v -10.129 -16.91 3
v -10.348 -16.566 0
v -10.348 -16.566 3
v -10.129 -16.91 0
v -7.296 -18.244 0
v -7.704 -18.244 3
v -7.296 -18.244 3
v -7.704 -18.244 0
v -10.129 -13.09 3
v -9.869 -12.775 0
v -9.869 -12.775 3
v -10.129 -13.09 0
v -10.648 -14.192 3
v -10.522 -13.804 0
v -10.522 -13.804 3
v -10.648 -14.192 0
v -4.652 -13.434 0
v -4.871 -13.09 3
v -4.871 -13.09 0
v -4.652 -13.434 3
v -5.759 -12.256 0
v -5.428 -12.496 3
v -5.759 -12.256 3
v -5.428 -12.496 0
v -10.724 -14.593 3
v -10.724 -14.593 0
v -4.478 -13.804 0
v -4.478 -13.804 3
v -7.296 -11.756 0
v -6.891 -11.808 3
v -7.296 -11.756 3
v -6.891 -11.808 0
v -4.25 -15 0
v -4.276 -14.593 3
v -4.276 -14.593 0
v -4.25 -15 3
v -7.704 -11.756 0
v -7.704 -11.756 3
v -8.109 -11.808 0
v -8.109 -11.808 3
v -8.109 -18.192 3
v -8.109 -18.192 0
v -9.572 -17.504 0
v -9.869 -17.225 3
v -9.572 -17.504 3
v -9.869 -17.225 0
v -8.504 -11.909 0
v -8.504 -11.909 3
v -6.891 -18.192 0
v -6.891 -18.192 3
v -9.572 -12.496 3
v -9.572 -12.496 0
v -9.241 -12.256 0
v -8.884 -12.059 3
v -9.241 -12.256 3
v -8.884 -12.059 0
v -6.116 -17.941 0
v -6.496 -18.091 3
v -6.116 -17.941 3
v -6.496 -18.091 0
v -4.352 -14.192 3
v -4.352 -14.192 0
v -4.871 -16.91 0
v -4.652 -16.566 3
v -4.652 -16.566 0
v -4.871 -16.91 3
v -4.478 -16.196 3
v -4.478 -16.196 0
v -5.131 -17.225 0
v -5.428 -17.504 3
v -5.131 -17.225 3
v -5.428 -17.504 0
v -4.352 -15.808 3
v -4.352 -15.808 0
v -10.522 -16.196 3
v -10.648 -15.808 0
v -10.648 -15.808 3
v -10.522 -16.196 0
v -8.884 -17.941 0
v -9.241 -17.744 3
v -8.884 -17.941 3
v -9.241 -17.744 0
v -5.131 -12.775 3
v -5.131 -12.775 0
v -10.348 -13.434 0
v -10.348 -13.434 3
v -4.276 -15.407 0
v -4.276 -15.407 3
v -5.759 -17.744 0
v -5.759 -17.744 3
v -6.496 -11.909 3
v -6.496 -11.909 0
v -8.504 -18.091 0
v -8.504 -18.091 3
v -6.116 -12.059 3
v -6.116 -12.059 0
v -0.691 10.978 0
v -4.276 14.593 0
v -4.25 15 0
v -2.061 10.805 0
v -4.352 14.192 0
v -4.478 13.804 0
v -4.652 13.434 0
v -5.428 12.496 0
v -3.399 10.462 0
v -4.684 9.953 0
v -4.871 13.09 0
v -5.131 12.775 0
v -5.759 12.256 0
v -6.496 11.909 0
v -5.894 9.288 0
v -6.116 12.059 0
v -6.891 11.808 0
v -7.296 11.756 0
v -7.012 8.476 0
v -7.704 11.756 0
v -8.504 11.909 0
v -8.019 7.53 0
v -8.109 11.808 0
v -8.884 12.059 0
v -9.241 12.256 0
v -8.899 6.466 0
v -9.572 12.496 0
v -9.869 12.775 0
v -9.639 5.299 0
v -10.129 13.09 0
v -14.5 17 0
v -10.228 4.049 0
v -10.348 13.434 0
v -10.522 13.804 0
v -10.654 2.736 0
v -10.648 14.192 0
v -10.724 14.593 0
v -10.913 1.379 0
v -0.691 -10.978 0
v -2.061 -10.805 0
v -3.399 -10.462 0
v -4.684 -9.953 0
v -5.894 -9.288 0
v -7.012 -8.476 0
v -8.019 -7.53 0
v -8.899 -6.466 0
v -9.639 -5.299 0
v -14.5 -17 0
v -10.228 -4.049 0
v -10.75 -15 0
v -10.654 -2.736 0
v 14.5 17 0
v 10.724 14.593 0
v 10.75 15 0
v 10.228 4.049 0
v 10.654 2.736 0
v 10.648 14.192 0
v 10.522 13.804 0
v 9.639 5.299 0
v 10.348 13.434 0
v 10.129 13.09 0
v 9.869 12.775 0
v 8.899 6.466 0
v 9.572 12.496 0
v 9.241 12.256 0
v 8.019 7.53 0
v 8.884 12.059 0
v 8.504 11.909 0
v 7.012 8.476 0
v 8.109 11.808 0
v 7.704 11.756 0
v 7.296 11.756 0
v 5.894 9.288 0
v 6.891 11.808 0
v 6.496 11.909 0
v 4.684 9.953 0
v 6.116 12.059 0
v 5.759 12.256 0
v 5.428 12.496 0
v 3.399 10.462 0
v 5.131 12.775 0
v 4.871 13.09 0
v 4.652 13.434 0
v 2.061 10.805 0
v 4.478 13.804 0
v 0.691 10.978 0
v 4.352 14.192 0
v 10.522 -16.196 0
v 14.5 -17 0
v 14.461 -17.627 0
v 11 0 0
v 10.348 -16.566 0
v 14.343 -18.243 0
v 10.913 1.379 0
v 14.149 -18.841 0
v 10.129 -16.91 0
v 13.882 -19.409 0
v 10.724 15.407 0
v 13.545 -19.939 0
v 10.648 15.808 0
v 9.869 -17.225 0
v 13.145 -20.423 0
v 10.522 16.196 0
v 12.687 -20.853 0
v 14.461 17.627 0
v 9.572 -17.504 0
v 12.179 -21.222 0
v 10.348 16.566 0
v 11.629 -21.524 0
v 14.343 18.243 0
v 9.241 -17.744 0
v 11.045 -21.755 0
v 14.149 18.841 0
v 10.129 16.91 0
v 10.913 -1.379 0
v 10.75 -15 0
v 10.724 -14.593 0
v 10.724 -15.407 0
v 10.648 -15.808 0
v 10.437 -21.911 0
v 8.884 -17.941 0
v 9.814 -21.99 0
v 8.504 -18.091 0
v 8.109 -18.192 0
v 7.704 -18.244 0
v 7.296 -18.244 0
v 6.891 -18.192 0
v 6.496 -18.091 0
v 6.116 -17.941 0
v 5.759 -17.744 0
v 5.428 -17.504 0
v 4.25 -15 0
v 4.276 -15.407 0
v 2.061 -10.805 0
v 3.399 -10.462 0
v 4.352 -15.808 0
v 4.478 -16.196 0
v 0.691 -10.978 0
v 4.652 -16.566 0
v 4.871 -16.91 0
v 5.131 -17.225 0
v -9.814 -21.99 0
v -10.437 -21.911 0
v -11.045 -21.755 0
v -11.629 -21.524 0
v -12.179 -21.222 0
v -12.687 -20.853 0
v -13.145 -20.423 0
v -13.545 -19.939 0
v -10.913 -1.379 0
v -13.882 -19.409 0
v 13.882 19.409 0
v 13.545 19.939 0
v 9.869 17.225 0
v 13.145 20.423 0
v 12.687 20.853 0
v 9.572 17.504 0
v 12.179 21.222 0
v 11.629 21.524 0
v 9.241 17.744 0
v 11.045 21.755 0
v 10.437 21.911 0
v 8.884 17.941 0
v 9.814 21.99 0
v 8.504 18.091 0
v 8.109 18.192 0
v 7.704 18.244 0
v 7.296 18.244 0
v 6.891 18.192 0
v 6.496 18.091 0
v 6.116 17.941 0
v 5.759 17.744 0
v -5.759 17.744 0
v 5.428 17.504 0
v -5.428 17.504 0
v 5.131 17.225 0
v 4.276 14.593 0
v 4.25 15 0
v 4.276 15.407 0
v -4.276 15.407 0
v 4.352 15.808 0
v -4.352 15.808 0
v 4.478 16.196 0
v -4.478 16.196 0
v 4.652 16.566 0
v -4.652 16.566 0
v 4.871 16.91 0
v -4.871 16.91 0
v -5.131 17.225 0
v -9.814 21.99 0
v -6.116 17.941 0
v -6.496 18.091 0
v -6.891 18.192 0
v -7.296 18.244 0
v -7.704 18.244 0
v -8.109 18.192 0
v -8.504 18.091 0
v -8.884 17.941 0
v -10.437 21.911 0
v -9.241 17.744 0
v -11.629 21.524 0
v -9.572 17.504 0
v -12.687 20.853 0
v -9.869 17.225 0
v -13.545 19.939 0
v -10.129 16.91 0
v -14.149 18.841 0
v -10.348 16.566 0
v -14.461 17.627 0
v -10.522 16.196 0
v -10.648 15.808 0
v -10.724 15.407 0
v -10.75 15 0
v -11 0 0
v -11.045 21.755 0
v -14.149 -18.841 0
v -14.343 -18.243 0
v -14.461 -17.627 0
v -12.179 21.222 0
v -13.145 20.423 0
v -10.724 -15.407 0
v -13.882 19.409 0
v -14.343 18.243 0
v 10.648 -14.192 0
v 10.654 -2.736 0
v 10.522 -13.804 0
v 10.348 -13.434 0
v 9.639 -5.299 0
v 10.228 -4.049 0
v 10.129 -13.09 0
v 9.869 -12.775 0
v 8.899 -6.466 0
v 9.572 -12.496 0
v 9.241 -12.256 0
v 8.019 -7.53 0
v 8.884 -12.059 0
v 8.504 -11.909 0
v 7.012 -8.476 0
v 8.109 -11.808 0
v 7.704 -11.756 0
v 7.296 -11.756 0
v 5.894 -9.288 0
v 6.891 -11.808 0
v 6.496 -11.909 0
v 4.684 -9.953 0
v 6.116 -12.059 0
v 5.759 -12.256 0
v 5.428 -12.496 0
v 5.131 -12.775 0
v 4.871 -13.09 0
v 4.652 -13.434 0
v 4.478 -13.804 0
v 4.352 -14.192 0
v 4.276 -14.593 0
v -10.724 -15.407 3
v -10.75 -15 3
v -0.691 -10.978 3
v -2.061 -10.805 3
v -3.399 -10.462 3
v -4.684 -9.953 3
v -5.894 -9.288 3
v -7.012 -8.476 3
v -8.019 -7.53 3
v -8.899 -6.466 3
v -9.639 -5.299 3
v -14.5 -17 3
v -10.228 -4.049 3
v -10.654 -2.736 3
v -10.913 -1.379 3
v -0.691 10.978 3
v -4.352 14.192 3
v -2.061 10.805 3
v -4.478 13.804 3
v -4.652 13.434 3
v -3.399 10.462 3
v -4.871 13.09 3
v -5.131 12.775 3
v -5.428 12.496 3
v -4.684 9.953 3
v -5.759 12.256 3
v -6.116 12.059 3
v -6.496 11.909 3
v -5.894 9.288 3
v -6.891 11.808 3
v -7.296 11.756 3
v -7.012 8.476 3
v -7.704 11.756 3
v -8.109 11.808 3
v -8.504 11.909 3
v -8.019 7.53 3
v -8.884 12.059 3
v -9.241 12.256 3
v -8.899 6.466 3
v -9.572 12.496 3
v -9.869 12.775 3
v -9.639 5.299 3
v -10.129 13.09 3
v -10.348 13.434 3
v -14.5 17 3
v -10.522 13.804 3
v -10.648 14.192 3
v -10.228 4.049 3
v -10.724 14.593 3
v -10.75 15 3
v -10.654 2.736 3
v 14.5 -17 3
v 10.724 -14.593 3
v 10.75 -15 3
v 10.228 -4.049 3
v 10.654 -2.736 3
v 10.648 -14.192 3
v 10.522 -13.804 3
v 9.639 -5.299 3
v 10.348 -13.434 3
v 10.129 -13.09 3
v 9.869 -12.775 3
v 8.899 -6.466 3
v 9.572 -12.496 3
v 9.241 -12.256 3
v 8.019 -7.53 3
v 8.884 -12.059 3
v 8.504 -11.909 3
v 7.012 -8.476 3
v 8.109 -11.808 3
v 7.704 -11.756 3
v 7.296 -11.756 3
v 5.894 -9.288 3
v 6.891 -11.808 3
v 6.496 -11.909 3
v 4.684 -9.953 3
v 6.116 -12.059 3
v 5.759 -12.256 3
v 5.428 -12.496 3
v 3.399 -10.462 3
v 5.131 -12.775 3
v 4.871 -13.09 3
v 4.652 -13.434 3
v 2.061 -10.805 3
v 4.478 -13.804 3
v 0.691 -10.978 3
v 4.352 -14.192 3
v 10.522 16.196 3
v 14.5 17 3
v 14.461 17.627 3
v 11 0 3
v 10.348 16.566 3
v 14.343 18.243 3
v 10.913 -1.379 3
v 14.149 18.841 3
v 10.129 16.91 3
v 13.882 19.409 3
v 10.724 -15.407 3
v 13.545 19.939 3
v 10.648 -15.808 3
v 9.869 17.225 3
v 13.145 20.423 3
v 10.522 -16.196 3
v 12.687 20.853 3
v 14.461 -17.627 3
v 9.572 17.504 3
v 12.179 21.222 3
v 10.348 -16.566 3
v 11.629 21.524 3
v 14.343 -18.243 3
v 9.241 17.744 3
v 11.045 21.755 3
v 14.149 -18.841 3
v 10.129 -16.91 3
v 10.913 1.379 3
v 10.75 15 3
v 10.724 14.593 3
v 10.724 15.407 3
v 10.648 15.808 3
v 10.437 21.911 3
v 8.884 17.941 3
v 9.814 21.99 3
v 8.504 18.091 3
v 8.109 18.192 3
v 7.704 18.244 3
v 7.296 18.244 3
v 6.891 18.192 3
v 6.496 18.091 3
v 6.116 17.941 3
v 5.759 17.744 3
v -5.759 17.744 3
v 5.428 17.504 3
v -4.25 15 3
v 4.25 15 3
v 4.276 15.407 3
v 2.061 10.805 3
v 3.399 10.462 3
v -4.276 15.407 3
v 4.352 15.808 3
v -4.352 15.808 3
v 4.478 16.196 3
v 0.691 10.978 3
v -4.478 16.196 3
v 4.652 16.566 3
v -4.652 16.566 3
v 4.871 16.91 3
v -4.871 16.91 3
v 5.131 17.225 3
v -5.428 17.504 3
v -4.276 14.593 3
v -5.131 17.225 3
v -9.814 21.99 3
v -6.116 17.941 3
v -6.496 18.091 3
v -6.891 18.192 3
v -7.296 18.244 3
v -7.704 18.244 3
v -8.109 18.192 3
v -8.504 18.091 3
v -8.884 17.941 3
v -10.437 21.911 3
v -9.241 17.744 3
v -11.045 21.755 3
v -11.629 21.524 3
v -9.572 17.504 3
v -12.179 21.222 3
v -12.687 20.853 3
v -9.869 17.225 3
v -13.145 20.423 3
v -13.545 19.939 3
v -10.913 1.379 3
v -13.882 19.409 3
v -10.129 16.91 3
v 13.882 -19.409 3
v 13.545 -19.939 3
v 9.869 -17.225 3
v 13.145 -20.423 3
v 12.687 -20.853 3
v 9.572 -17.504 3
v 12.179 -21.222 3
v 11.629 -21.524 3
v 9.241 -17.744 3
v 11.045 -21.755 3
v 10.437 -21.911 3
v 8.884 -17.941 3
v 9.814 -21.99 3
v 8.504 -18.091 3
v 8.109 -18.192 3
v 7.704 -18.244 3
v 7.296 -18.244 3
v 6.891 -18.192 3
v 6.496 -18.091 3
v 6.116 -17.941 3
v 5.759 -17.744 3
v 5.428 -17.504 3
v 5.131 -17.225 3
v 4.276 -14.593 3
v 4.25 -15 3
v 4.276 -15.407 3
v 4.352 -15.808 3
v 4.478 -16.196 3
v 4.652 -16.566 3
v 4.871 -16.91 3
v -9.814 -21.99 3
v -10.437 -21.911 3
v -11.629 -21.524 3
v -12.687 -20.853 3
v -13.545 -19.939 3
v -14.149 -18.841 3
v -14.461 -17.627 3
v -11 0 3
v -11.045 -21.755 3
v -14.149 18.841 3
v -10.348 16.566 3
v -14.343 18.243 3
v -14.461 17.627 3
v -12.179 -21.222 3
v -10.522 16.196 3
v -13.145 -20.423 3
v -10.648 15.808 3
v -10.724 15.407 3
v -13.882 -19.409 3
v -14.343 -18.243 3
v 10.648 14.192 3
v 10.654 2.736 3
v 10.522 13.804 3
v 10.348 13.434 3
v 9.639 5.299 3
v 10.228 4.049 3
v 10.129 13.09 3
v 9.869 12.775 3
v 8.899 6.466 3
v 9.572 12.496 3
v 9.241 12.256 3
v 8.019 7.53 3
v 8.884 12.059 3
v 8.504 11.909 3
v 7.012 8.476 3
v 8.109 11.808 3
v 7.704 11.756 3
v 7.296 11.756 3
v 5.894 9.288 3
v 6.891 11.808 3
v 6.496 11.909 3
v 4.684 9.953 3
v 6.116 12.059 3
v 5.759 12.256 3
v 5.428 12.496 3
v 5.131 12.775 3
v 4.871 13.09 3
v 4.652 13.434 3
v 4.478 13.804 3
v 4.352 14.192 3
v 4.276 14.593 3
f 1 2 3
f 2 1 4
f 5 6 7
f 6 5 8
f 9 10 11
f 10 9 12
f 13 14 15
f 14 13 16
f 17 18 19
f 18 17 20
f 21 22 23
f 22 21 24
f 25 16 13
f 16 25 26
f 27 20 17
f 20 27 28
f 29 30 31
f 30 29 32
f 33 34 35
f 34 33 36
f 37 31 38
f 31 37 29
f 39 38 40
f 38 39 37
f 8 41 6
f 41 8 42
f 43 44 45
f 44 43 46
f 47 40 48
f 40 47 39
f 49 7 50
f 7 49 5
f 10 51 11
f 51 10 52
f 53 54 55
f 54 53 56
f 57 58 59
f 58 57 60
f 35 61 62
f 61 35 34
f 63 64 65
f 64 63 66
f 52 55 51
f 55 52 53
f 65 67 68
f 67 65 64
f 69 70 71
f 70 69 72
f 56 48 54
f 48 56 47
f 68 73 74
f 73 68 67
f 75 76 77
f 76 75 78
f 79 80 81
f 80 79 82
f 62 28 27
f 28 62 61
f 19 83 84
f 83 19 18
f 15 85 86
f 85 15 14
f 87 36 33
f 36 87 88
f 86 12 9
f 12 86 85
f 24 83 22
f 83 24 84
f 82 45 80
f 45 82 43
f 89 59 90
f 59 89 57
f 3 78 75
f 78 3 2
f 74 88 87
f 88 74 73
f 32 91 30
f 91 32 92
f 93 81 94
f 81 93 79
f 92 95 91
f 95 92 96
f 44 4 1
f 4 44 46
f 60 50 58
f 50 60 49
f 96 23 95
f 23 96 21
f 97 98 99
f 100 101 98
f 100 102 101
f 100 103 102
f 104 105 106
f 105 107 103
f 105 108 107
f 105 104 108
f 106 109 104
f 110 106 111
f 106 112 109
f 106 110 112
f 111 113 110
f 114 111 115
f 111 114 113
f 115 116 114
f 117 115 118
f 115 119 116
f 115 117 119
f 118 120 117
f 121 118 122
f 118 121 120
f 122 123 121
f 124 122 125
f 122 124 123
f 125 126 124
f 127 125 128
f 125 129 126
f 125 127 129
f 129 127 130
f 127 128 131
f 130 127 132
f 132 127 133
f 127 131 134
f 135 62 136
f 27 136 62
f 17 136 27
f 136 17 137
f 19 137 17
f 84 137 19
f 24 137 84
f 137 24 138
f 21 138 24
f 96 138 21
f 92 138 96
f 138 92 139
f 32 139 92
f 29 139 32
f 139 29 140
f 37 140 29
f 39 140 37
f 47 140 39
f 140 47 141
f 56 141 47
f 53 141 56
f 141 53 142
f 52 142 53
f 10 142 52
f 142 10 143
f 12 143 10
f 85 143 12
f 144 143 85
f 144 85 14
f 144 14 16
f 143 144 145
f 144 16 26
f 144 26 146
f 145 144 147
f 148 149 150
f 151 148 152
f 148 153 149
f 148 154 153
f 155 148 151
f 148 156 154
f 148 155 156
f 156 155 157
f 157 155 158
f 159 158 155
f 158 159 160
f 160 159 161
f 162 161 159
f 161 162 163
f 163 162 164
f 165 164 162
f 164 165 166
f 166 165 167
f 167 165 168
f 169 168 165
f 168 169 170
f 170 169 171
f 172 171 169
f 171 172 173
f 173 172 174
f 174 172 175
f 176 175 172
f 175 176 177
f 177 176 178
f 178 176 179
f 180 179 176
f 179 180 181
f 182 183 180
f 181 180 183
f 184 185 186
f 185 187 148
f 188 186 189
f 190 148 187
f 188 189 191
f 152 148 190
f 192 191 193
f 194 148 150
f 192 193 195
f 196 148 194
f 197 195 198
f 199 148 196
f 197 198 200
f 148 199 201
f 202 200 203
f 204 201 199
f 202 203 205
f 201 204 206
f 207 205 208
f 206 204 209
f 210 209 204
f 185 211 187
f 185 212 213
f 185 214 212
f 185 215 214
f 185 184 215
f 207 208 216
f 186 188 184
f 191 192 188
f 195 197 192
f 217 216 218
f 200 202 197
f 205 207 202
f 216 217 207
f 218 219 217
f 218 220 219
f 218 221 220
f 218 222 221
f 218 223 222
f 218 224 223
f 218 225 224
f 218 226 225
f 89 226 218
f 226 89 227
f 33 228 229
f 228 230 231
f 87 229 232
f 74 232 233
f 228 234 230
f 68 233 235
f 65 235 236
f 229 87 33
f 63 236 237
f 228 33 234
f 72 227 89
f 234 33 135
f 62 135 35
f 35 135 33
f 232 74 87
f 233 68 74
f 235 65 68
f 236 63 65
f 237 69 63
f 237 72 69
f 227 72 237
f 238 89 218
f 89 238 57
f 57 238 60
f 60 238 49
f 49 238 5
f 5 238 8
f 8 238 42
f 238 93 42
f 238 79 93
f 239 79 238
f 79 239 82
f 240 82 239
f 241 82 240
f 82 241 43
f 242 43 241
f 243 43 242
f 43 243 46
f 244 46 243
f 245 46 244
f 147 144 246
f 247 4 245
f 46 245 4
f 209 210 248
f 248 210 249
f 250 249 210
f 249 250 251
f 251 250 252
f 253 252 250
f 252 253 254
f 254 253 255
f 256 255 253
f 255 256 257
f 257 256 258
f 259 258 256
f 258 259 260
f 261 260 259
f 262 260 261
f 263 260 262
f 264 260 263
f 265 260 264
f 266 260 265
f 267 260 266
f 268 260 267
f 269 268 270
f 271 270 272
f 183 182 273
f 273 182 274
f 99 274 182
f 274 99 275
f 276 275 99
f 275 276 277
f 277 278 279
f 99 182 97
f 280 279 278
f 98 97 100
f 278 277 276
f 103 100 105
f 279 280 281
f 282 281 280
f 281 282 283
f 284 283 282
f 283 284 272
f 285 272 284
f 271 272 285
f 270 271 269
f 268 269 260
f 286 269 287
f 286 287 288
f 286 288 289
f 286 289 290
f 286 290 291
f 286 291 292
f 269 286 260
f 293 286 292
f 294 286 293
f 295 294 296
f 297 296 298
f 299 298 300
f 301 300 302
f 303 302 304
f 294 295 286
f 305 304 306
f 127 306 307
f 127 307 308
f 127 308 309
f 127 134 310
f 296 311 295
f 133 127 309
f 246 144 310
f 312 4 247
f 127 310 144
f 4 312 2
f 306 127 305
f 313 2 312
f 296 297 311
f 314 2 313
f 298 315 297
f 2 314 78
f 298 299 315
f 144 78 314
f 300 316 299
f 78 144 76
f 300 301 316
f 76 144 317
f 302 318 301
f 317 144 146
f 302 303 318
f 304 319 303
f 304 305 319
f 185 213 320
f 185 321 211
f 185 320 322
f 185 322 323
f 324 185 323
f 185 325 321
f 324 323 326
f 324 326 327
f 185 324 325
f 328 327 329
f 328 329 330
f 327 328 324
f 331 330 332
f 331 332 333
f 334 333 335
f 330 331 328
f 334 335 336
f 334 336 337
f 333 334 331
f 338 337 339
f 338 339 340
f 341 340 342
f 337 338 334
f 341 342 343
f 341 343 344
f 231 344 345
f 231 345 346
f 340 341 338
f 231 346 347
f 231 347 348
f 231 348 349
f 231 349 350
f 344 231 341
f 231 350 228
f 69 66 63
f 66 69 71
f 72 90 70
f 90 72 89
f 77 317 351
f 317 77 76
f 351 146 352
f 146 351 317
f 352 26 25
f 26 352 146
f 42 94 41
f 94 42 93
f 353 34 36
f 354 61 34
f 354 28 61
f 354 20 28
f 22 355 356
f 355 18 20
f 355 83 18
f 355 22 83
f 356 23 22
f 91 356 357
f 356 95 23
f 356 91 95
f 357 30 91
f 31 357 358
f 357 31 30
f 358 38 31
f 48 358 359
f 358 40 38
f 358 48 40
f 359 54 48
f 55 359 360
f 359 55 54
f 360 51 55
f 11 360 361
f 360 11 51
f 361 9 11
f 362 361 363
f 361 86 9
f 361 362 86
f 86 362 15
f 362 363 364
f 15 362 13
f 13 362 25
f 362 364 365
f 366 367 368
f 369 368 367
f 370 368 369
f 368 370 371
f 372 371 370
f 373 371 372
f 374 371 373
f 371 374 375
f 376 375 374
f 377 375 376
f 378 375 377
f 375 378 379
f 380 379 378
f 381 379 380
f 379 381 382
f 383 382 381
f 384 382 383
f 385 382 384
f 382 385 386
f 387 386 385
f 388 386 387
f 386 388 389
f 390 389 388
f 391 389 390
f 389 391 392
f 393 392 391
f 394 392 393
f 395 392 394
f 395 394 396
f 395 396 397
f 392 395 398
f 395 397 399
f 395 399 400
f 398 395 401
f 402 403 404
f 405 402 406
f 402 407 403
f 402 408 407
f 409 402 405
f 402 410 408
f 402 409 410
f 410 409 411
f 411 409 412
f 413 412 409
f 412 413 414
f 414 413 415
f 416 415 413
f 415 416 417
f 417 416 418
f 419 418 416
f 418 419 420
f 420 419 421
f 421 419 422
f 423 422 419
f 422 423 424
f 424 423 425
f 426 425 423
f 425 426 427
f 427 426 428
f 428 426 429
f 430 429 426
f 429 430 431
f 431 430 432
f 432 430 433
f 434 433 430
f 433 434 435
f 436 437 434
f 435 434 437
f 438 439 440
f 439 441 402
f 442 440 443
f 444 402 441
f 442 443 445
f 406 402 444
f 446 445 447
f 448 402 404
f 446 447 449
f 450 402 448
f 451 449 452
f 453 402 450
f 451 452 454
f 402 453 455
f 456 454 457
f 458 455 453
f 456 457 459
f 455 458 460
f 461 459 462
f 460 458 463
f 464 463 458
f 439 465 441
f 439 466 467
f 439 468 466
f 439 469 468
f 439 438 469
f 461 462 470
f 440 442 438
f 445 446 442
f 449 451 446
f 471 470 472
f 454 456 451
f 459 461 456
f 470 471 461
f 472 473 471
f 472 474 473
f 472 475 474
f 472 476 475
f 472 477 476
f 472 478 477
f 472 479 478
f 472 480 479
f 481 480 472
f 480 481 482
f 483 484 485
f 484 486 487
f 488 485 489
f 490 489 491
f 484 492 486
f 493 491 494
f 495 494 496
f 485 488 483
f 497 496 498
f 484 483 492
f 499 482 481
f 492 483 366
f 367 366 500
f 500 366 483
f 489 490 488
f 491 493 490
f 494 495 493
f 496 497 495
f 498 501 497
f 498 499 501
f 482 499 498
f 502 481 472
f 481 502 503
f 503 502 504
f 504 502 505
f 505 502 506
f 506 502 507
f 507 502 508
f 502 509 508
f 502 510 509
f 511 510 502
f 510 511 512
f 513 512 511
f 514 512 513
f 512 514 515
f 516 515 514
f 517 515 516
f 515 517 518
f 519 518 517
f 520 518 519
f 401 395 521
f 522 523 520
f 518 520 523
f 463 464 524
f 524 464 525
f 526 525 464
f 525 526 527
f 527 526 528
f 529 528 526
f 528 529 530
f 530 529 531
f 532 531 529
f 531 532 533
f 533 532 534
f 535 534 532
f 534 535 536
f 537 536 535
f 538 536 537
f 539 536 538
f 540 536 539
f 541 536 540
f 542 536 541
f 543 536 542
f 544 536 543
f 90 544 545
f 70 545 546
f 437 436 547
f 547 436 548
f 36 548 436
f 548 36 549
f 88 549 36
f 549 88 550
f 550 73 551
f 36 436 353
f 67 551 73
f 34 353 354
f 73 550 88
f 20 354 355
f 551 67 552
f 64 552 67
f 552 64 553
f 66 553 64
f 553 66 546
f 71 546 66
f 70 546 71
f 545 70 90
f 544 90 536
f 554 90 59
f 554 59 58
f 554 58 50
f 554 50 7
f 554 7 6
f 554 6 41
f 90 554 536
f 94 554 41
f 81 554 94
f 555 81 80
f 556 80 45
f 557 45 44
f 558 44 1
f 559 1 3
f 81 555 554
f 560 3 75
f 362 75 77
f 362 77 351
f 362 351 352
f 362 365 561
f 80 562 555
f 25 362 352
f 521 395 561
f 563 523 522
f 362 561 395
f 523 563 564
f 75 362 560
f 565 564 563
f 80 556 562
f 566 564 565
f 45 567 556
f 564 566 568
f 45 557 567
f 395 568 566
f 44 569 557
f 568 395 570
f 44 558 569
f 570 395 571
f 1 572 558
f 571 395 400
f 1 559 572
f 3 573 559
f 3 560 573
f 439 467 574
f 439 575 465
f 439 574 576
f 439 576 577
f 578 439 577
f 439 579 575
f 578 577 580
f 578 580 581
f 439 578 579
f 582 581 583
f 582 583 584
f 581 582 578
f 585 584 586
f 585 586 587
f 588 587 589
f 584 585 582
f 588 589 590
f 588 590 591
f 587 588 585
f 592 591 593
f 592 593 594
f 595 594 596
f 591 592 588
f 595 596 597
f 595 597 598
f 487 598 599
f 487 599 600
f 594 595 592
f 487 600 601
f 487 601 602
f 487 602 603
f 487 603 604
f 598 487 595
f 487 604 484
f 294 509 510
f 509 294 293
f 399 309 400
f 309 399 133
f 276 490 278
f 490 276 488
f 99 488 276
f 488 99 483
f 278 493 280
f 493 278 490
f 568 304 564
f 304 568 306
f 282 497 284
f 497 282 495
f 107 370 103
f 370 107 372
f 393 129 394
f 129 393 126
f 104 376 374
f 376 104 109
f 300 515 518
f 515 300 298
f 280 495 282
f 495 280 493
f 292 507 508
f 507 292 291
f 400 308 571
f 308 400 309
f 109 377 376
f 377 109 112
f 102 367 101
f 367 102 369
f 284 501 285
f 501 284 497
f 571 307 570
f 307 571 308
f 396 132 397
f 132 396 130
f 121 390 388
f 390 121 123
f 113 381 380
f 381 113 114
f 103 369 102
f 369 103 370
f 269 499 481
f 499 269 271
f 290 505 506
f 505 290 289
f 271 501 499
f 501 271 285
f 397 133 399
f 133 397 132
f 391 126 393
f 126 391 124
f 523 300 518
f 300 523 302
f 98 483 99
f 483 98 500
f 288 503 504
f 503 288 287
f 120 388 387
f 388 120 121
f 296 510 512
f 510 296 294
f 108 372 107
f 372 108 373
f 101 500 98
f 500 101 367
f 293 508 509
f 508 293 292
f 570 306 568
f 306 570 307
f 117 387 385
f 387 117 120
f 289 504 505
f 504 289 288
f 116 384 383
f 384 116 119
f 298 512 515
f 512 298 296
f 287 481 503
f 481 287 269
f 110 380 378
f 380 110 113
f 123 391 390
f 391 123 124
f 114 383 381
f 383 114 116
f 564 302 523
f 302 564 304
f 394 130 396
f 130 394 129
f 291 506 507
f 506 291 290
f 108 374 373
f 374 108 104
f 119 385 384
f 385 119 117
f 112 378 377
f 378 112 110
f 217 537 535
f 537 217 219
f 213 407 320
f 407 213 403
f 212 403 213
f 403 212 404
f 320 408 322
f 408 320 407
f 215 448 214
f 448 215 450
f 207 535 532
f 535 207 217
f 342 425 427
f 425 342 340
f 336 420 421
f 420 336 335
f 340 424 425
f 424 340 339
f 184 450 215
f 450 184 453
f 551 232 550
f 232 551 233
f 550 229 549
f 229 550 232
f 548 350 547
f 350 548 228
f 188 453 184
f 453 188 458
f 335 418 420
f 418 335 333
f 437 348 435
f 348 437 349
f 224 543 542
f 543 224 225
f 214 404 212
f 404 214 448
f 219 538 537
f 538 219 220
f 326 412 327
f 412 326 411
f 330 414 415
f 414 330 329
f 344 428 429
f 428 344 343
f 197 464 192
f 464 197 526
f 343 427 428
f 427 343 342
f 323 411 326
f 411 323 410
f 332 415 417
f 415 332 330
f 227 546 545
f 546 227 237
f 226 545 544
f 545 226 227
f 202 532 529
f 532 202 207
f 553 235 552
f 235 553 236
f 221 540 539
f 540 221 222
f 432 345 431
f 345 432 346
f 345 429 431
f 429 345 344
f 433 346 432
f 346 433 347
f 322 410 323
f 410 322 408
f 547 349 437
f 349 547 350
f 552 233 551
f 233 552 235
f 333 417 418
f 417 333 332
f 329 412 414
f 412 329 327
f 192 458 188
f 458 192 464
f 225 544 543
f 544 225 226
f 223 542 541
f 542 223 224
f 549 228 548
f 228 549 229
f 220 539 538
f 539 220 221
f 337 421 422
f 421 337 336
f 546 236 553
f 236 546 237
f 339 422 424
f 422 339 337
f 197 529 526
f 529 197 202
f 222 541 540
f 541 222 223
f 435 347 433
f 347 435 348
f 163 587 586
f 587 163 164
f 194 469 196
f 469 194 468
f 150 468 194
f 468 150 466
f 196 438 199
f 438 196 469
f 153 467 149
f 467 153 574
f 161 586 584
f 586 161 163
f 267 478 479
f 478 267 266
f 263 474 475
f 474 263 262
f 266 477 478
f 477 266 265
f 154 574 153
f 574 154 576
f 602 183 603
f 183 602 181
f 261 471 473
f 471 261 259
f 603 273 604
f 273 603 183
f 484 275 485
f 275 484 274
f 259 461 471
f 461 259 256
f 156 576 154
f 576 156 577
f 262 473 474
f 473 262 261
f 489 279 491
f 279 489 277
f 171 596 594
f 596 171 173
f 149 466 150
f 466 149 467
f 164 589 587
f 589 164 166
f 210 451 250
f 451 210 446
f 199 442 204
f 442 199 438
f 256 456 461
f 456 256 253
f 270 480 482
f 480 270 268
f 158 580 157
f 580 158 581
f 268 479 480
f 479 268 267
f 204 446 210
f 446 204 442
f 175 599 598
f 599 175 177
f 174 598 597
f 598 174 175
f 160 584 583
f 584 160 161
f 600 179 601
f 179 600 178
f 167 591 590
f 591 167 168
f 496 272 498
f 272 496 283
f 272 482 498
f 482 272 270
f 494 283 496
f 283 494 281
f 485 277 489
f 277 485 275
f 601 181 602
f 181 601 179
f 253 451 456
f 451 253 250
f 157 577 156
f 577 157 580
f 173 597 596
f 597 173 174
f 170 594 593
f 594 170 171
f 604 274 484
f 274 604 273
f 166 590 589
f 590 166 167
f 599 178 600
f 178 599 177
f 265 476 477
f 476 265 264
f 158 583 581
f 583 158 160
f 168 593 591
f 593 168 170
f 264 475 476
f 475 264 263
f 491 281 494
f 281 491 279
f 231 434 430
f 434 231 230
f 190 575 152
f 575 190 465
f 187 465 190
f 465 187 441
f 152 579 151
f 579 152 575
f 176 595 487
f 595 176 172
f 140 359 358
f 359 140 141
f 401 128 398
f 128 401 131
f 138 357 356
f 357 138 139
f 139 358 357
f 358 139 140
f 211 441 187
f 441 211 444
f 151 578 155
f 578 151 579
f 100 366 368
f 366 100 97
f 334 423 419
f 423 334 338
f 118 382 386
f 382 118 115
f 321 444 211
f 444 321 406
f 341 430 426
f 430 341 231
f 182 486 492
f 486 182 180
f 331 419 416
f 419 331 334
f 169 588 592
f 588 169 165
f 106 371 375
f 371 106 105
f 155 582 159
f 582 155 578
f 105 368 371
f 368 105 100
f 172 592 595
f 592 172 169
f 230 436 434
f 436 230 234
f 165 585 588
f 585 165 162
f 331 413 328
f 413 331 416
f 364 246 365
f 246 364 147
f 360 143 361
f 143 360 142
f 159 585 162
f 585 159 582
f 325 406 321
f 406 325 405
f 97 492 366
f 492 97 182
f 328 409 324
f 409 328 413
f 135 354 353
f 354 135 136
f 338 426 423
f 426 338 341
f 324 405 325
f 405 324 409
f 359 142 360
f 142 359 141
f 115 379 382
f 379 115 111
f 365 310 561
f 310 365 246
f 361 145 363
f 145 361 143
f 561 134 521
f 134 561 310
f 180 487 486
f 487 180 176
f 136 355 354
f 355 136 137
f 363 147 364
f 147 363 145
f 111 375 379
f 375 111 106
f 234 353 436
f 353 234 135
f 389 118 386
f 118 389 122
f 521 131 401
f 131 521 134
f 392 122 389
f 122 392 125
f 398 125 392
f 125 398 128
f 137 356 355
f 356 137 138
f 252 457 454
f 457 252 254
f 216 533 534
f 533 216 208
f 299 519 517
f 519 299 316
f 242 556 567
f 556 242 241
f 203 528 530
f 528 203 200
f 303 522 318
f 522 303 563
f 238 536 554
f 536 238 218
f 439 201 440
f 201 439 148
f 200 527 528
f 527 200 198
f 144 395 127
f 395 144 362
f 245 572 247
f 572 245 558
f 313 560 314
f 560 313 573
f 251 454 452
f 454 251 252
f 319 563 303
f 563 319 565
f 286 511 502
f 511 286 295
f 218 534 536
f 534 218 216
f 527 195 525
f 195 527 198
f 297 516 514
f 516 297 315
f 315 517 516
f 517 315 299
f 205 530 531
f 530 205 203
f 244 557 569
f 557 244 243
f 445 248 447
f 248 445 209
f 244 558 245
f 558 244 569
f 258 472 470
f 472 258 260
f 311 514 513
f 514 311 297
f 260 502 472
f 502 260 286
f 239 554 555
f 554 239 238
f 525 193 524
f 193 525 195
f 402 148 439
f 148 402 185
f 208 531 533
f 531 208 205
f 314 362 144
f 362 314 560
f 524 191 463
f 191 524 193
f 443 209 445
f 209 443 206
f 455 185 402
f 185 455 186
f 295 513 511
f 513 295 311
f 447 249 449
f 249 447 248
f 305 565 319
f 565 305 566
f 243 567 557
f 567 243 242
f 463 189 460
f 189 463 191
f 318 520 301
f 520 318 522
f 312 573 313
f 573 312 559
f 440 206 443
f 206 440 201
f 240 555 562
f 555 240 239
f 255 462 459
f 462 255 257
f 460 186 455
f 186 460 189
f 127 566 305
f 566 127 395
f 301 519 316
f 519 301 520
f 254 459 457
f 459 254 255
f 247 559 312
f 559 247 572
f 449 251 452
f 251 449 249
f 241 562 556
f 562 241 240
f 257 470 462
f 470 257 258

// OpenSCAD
$fn = 50;

difference() {
	union() {
		hull() {
			translate(v = [-9.5, 17.0, 0]) {
				cylinder(h = 3, r = 5);
			}
			translate(v = [9.5, 17.0, 0]) {
				cylinder(h = 3, r = 5);
			}
			translate(v = [-9.5, -17.0, 0]) {
				cylinder(h = 3, r = 5);
			}
			translate(v = [9.5, -17.0, 0]) {
				cylinder(h = 3, r = 5);
			}
		}
	}
	union() {
		translate(v = [-7.5, -15.0, 0]) {
			cylinder(h = 3, r = 3.25);
		}
		translate(v = [-7.5, 15.0, 0]) {
			cylinder(h = 3, r = 3.25);
		}
		translate(v = [7.5, -15.0, 0]) {
			cylinder(h = 3, r = 3.25);
		}
		translate(v = [7.5, 15.0, 0]) {
			cylinder(h = 3, r = 3.25);
		}
		cylinder(h = 3, r = 11.0);
	}
}
